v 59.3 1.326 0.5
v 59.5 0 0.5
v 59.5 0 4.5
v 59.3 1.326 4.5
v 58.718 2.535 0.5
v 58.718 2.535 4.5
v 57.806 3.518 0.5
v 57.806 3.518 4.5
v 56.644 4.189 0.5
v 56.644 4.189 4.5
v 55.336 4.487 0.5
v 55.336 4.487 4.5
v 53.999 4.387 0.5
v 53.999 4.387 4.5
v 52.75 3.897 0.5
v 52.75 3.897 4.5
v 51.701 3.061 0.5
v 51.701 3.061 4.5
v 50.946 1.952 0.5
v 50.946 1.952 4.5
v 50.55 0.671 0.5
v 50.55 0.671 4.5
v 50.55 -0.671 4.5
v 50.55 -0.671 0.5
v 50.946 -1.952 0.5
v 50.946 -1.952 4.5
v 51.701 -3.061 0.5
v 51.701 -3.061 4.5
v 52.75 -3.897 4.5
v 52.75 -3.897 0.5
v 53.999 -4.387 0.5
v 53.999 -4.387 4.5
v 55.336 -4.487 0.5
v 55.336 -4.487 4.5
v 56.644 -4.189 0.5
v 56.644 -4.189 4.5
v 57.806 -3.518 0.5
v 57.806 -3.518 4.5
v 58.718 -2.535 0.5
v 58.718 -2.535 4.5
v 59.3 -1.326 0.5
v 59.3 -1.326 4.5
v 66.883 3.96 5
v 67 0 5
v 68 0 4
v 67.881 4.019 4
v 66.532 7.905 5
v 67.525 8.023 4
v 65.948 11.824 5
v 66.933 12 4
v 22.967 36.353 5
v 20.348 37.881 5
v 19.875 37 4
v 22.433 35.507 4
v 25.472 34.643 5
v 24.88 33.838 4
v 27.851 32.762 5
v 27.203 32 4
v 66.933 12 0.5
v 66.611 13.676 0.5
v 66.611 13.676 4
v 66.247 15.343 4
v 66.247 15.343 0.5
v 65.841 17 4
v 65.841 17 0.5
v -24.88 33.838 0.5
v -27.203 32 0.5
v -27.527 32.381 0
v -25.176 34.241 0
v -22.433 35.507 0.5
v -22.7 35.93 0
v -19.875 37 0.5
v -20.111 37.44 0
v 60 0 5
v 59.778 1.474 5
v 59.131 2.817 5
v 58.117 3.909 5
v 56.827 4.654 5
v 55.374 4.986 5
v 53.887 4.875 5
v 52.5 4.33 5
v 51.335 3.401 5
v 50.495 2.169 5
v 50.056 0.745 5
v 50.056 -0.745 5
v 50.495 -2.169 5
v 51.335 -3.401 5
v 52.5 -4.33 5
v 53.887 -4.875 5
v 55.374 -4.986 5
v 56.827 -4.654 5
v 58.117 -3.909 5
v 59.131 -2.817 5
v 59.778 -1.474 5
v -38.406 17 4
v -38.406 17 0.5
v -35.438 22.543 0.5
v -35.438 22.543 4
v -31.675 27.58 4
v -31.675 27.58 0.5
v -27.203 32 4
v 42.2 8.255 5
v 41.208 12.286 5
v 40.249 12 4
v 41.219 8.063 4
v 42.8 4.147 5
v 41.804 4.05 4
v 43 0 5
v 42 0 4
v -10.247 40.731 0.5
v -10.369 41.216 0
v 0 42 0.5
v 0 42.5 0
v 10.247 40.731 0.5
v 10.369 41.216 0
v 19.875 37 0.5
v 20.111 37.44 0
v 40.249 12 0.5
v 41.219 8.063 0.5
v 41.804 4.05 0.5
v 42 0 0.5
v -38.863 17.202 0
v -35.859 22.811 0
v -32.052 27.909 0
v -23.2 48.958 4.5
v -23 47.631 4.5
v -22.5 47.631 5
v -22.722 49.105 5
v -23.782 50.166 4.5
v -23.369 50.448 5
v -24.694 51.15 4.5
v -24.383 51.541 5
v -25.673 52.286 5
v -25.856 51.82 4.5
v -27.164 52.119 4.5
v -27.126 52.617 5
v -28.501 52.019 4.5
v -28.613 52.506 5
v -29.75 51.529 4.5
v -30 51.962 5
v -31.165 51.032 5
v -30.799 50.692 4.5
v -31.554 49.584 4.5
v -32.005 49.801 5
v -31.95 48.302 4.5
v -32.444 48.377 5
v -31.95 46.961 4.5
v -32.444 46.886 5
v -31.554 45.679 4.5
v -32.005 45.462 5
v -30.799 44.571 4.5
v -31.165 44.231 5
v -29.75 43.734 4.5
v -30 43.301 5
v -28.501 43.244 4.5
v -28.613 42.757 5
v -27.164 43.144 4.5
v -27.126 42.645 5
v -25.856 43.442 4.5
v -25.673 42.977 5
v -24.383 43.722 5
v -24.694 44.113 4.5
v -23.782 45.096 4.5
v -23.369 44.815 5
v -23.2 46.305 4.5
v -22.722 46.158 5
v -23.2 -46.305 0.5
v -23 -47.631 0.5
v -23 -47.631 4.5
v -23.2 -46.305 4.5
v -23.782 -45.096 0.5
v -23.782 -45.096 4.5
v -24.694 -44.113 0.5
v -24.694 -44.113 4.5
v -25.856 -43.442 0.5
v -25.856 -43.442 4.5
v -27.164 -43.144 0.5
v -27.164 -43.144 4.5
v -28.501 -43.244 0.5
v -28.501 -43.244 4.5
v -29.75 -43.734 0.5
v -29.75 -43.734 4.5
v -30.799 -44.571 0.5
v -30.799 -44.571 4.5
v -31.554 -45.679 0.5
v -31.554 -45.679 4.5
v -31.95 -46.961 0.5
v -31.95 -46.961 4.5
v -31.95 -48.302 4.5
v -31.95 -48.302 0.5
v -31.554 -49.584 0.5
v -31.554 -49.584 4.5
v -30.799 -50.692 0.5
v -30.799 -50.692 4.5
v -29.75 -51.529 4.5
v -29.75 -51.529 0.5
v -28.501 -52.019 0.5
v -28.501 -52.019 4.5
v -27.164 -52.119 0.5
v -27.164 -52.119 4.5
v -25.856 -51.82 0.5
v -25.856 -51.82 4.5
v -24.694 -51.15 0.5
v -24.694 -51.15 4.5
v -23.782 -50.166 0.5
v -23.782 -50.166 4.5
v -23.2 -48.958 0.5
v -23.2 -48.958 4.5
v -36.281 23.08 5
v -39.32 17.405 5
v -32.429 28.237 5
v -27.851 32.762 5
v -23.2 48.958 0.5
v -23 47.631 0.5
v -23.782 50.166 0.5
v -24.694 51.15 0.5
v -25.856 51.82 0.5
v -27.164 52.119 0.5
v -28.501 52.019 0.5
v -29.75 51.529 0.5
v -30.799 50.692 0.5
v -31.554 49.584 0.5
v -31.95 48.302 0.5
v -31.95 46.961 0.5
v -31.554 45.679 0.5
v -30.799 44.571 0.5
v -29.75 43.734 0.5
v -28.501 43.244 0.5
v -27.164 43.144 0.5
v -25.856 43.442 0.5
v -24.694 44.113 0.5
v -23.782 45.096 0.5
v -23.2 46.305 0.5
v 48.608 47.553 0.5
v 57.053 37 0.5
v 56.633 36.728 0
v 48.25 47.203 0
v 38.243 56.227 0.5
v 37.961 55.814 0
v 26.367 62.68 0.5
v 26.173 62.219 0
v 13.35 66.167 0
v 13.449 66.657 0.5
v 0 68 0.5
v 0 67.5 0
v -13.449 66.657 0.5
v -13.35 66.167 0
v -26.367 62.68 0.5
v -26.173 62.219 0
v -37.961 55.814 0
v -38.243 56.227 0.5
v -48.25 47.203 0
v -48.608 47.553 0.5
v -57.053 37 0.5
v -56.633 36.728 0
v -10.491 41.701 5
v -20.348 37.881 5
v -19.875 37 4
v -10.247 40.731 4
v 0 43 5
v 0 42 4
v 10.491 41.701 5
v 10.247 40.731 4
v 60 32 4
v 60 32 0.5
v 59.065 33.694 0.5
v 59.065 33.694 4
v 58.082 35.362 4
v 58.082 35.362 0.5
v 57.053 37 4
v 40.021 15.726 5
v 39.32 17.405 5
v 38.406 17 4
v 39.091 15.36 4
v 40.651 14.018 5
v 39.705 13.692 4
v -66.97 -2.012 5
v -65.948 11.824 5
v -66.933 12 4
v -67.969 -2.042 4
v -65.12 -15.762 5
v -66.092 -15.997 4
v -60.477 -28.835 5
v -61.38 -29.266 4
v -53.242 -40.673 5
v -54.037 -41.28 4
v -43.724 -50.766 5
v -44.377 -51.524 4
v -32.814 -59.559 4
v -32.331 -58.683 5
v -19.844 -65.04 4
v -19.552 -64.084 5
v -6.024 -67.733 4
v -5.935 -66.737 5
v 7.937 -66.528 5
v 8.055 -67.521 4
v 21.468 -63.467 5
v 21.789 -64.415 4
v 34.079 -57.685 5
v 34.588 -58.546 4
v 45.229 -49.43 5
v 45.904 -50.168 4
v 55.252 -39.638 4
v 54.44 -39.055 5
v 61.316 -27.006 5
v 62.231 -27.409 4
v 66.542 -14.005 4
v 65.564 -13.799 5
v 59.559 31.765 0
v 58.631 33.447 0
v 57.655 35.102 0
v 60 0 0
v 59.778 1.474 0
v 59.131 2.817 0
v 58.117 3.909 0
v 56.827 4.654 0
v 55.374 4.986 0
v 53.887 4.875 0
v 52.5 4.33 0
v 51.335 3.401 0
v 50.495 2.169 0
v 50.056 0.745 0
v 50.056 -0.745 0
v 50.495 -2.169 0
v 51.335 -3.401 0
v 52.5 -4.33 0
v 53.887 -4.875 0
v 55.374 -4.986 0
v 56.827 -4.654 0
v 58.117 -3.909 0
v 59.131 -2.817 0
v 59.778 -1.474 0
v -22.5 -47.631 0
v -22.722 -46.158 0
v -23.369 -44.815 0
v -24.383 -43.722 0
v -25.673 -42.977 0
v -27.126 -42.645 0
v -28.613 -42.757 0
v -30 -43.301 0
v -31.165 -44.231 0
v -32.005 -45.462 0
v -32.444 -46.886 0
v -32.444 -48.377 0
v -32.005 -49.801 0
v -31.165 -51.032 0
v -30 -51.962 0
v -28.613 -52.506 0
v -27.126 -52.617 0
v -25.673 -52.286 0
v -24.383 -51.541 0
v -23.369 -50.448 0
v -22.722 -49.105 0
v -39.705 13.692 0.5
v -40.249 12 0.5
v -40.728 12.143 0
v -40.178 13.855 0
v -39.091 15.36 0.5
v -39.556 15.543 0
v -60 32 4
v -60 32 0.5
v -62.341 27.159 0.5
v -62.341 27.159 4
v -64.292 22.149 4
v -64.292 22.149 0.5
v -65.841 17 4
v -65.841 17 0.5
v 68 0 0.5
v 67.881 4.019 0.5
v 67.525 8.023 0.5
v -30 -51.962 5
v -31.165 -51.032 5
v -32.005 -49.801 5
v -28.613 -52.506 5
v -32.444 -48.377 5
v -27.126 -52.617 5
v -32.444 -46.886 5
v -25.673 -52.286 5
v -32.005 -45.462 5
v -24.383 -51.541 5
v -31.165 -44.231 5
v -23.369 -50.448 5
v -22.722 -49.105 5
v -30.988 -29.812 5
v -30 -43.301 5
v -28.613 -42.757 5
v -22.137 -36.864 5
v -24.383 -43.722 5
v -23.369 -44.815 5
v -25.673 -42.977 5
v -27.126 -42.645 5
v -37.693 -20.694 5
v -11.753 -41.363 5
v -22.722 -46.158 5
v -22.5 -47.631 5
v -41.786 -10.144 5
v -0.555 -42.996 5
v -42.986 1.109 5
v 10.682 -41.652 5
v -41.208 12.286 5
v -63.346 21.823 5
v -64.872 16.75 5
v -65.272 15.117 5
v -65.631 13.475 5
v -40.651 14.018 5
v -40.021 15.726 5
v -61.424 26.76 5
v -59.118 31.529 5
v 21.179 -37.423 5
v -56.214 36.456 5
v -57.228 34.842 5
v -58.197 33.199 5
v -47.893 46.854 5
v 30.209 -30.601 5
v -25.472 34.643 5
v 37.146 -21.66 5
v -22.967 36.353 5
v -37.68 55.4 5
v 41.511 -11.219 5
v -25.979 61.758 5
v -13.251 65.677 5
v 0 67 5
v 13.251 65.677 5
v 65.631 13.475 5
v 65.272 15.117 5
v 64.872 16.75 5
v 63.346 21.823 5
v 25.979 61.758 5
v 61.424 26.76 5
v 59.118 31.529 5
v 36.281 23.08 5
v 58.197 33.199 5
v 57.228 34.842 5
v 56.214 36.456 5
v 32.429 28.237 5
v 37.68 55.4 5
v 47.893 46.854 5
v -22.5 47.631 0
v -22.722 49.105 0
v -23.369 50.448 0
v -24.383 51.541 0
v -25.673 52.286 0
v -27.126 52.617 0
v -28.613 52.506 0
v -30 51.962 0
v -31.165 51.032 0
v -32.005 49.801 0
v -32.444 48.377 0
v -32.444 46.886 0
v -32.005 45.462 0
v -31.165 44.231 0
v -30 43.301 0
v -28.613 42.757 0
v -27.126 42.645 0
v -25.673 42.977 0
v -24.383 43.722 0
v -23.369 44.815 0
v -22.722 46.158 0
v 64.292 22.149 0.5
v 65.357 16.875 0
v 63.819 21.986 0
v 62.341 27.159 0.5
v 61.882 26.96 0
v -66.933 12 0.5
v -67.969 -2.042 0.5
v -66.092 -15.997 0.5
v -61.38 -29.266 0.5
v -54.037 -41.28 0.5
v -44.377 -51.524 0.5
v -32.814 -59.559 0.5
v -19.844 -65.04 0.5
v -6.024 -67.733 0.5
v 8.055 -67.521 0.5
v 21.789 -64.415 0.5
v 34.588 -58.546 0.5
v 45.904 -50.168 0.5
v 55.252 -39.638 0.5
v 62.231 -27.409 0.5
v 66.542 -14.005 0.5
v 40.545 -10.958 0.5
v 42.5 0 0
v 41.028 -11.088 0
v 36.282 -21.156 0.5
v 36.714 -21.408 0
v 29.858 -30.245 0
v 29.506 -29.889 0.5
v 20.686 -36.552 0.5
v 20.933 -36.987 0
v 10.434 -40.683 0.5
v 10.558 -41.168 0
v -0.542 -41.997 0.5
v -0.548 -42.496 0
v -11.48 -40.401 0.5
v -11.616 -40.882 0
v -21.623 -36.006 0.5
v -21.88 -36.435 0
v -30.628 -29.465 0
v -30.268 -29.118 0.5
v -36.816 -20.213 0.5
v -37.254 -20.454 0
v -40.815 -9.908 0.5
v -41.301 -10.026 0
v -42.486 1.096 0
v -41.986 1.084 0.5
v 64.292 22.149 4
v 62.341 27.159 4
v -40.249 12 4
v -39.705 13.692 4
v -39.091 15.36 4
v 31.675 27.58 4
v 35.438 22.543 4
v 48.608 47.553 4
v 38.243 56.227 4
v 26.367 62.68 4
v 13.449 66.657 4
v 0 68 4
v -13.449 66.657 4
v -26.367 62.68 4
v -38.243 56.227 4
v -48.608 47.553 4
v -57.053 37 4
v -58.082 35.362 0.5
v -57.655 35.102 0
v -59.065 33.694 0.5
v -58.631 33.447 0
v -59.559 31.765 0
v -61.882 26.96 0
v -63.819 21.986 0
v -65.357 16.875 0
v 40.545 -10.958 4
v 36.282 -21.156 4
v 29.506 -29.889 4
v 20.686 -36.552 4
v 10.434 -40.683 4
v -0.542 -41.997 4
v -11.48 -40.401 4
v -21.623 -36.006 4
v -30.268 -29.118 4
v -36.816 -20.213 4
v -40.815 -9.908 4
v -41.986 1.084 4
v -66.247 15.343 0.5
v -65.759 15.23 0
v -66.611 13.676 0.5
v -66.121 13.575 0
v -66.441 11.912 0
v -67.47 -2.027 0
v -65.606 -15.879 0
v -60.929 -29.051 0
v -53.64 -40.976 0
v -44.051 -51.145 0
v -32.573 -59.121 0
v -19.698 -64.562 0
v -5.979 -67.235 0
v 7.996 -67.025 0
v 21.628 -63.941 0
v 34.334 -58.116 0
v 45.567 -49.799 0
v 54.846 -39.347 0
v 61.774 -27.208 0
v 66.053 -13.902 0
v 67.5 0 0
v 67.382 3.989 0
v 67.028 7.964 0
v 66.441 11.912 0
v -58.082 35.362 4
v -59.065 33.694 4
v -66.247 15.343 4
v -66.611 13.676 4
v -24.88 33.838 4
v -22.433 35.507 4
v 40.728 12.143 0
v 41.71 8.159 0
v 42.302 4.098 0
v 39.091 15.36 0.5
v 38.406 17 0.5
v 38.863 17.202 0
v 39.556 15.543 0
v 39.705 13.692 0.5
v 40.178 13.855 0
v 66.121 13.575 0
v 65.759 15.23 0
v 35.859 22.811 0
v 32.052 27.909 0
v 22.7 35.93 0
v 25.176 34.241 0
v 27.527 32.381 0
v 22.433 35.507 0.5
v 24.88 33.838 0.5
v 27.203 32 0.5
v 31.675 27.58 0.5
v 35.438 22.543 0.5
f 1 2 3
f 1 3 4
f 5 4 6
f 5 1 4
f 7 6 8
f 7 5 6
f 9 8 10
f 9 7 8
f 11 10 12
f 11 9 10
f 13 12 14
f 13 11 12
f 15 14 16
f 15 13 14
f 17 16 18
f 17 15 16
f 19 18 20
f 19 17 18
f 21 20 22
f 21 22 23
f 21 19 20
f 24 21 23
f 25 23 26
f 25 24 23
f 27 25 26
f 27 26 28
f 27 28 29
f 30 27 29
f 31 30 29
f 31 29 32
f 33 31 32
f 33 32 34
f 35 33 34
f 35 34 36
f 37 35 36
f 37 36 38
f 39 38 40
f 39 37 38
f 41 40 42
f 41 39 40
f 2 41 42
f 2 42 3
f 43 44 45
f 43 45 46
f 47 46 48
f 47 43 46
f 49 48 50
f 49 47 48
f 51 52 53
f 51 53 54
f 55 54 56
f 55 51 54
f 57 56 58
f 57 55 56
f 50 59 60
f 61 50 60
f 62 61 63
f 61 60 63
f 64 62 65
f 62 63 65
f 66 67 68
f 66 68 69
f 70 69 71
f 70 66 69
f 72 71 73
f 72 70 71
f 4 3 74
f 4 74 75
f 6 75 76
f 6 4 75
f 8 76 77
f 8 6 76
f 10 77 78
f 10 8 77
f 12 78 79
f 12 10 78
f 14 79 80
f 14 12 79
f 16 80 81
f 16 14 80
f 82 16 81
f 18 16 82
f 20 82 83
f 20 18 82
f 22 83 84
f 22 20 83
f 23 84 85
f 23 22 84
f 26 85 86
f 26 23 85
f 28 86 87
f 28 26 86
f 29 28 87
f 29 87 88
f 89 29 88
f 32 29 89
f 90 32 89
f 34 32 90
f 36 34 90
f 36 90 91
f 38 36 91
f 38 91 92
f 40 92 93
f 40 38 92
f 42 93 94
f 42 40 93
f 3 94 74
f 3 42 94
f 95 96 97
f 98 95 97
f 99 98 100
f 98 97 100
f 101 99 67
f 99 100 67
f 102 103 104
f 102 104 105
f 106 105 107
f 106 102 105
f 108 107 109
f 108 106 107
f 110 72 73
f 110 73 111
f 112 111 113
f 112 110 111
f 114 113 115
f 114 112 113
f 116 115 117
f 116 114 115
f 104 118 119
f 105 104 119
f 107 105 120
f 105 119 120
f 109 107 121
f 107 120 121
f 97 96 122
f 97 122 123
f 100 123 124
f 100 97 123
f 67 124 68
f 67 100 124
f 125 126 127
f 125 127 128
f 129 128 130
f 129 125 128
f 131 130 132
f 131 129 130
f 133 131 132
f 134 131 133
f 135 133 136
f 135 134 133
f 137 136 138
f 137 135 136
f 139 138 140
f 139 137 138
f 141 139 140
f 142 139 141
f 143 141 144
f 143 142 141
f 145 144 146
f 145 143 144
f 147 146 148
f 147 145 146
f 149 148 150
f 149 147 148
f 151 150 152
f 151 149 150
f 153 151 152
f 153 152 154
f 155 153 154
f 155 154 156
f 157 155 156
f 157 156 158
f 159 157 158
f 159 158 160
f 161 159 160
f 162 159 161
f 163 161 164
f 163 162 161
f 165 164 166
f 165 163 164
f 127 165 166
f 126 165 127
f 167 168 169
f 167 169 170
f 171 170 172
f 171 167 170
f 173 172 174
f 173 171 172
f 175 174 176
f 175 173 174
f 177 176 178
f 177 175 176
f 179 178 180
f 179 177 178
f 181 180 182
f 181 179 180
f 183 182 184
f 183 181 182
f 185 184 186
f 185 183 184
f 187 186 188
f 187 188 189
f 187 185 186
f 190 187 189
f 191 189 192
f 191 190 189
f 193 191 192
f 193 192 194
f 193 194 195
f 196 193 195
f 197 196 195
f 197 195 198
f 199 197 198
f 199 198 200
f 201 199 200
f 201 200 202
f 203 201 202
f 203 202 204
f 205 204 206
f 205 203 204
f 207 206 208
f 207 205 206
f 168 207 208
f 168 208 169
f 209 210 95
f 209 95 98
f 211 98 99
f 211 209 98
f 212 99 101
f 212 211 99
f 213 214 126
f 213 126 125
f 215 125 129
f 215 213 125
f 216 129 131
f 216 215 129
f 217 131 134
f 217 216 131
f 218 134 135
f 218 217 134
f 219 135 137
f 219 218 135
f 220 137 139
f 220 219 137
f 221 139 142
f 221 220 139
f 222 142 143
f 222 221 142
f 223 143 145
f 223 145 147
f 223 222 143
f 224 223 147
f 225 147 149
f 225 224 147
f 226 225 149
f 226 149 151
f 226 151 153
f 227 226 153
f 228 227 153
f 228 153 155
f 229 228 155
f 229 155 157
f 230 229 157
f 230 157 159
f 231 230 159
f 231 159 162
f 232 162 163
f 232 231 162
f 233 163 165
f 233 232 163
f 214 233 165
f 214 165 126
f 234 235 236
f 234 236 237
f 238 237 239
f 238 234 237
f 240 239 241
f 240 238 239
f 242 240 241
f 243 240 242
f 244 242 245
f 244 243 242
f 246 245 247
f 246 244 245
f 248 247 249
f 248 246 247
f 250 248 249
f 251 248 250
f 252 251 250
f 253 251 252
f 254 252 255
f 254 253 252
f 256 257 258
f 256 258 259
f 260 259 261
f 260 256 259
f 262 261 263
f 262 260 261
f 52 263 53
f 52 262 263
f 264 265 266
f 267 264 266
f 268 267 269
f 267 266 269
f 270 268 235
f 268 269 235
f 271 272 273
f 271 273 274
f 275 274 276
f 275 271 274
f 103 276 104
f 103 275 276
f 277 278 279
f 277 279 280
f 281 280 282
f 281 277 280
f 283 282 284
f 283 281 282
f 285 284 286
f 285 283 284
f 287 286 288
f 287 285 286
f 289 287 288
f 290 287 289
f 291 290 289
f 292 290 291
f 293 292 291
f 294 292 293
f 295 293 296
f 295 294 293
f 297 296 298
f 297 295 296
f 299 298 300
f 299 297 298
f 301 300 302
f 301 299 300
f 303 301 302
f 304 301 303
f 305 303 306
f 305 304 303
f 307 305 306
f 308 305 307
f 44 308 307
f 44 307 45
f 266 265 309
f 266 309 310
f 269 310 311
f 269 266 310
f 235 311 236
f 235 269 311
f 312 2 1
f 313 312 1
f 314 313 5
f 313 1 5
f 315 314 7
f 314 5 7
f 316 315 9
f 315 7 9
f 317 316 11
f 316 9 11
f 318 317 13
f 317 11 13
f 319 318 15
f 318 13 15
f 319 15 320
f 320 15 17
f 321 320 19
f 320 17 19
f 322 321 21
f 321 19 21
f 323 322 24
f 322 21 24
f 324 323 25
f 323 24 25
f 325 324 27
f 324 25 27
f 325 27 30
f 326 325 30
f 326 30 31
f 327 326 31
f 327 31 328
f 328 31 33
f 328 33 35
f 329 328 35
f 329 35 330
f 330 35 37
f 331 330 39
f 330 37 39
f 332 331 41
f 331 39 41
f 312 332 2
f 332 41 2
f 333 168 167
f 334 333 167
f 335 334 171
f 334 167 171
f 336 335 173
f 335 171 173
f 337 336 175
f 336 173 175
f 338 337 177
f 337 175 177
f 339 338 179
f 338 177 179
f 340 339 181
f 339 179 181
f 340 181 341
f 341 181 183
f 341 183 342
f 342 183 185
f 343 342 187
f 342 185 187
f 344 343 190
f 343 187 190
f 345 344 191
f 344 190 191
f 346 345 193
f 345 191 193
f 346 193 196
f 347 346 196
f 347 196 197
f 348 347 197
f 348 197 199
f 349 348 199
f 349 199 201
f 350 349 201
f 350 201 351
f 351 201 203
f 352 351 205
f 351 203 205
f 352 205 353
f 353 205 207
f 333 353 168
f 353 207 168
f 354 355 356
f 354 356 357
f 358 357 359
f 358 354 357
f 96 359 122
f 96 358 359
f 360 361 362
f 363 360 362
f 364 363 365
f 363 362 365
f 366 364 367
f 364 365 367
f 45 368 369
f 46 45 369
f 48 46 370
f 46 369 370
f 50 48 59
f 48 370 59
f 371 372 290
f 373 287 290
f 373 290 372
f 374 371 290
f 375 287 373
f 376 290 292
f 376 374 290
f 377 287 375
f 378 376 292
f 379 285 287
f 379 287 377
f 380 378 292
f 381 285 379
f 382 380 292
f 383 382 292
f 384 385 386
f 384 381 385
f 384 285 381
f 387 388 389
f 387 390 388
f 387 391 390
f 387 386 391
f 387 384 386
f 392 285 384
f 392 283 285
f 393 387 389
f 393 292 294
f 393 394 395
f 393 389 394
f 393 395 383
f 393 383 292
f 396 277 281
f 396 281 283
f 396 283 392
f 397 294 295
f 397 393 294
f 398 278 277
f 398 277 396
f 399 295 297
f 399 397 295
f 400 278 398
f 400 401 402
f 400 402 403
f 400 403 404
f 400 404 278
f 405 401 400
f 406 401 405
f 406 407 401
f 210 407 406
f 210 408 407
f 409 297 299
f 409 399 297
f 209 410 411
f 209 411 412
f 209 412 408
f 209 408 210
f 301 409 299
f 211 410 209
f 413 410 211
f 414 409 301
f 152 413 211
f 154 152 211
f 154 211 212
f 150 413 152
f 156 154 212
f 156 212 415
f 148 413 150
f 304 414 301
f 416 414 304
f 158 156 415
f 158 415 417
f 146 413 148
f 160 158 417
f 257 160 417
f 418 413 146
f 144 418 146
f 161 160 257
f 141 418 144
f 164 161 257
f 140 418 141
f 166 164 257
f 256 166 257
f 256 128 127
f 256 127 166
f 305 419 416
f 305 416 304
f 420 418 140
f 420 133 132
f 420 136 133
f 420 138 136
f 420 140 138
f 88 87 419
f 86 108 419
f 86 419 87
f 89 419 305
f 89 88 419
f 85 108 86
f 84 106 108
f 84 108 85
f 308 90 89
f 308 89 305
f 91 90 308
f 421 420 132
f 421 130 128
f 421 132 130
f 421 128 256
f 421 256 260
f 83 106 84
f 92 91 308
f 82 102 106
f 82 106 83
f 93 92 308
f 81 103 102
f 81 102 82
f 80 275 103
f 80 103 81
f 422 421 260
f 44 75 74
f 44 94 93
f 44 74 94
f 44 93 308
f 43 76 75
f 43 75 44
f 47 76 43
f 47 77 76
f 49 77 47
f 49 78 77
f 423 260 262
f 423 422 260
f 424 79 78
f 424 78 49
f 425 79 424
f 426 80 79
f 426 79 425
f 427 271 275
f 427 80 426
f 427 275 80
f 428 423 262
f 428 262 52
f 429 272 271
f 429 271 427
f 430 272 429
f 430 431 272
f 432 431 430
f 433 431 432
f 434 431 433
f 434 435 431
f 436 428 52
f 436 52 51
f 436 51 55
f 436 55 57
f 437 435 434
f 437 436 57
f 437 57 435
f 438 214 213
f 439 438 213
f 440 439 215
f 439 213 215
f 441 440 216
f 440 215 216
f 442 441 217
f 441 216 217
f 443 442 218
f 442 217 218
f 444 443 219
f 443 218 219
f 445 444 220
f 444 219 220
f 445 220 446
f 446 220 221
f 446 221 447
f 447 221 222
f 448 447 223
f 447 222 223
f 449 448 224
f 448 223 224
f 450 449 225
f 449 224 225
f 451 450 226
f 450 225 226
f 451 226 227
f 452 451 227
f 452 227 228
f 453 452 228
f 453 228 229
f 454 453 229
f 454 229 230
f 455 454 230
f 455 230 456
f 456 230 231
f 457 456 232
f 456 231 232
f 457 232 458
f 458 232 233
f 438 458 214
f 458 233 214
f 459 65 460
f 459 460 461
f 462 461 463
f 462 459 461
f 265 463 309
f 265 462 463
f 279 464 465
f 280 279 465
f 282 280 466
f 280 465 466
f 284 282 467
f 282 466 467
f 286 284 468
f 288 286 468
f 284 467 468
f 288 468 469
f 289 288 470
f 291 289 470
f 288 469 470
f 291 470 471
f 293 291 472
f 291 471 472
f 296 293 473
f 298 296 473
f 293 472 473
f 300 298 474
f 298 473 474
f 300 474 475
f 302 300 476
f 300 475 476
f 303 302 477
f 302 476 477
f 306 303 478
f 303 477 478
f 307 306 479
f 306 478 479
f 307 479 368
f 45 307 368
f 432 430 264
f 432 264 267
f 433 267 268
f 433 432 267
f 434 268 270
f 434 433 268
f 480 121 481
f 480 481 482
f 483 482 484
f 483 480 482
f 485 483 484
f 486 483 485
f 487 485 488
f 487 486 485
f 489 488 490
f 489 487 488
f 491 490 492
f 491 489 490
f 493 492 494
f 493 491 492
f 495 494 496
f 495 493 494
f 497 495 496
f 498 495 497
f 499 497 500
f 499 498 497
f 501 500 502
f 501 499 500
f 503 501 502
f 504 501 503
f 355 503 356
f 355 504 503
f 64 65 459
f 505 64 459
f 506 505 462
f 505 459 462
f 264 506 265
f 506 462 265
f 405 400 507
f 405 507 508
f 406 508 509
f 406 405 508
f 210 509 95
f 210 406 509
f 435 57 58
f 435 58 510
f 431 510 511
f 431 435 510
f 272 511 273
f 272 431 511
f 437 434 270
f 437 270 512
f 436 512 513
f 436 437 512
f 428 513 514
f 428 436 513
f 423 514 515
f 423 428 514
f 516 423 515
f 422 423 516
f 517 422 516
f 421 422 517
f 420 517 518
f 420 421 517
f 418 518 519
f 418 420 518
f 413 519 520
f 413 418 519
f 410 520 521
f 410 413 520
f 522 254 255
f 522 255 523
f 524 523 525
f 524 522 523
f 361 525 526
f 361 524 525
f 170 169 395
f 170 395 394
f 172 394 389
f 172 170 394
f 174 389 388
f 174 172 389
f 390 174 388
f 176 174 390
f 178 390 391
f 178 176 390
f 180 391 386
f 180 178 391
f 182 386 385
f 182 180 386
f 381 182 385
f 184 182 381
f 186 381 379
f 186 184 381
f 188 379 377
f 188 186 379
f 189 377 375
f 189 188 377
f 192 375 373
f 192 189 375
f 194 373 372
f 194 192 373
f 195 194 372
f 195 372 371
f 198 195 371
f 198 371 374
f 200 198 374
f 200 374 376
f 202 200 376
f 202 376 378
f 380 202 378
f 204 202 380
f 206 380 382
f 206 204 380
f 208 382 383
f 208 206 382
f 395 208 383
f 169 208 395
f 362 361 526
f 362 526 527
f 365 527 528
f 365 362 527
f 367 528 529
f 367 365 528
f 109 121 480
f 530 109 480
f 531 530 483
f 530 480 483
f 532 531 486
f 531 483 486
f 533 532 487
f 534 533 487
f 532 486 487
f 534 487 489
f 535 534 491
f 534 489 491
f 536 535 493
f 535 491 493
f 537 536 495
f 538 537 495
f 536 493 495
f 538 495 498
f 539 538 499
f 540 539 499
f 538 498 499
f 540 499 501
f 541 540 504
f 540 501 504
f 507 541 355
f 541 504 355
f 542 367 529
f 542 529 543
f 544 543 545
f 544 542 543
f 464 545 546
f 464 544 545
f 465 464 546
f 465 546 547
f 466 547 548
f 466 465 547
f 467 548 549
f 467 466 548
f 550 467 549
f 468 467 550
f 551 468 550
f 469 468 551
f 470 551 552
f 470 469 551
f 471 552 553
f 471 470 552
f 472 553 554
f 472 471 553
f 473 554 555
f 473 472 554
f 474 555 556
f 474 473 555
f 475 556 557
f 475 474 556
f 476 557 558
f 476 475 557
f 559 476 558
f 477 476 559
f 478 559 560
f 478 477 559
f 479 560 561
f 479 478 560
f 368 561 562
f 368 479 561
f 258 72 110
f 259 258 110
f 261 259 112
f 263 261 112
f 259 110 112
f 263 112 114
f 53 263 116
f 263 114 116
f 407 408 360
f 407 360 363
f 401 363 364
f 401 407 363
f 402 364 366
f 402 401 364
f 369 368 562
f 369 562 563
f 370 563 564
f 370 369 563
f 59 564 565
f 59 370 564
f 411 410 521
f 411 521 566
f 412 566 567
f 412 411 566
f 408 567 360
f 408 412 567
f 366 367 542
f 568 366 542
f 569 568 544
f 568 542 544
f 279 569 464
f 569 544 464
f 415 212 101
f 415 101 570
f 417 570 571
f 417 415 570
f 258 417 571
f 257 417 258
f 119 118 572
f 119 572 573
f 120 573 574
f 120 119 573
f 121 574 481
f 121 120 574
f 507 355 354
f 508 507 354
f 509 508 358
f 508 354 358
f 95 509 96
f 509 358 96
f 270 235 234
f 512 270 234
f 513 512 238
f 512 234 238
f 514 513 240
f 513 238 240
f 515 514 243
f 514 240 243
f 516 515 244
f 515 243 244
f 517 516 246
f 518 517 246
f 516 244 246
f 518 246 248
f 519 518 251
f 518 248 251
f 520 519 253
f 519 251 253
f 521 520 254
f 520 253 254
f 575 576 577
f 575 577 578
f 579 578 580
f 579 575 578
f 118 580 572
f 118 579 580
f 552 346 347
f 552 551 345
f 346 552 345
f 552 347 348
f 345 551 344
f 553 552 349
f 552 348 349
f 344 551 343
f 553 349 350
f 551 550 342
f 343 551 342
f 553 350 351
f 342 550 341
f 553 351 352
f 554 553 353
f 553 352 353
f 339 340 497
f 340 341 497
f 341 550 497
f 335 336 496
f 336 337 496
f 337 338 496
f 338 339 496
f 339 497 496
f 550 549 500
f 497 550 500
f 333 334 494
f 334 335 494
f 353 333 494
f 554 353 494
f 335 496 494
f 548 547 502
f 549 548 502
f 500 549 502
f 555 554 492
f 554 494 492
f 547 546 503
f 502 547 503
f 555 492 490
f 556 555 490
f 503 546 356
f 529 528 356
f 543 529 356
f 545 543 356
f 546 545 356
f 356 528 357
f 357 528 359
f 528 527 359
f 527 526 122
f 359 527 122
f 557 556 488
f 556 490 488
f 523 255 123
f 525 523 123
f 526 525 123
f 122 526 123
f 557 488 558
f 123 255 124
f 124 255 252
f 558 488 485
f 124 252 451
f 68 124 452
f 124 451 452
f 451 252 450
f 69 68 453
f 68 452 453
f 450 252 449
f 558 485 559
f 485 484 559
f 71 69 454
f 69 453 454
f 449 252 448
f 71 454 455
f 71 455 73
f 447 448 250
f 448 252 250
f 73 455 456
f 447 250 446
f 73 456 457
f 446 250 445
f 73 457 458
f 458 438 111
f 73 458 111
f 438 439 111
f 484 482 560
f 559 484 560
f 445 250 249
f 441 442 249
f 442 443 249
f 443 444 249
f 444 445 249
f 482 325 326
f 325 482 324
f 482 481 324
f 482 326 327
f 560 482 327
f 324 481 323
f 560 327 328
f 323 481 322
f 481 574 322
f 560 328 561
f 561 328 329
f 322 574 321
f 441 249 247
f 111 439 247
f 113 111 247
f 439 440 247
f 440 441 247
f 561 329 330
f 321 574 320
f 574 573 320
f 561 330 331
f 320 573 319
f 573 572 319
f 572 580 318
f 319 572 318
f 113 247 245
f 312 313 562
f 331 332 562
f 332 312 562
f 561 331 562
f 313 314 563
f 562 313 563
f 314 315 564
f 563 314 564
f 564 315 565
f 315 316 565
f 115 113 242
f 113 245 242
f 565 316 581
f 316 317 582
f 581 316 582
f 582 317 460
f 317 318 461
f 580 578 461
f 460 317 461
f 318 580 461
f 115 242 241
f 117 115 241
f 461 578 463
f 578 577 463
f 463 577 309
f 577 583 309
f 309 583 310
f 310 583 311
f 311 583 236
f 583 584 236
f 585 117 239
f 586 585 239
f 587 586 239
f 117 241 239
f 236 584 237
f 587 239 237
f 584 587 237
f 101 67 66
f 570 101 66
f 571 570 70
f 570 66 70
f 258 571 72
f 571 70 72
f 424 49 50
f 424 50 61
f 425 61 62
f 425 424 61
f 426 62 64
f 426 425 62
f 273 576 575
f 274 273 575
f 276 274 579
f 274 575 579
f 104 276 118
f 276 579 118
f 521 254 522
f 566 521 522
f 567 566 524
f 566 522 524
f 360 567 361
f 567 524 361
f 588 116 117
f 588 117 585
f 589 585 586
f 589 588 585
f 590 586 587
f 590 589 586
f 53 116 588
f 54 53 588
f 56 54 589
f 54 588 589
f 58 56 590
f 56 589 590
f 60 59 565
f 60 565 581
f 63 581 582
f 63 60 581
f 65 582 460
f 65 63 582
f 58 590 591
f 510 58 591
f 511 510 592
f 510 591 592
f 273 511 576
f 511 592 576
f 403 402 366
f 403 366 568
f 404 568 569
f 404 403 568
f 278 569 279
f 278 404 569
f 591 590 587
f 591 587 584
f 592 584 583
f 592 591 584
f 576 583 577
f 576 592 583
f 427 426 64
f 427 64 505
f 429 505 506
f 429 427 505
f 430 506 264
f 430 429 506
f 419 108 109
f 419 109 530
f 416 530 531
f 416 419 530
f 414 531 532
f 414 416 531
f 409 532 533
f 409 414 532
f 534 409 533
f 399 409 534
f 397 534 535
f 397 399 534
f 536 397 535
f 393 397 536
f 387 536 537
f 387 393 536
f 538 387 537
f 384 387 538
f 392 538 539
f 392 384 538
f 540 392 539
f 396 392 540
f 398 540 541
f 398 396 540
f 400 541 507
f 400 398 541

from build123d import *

# Parameters (mm, degrees)
F0_R     = 4.5
F1_DEPTH = 5
F2_SIZE  = 1
F3_SIZE  = 0.5


with BuildPart() as f1:
    # F0 (on Top) → F1 (new body)
    with BuildSketch(Plane.XY):
        with BuildLine():
            Line((55.8569601751, 37), (57.0526073024, 37))
            ThreePointArc((57.0526073024, 37), (0, 68), (-57.0526073024, 37))
            Line((-57.0526073024, 37), (-55.8569601751, 37))
            ThreePointArc((-55.8569601751, 37), (0, 67), (55.8569601751, 37))
        make_face()
        with BuildLine():
            Line((21.9089023002, 37), (55.8569601751, 37))
            ThreePointArc((55.8569601751, 37), (0, 67), (-55.8569601751, 37))
            Line((-55.8569601751, 37), (-21.9089023002, 37))
            ThreePointArc((-21.9089023002, 37), (0, 43), (21.9089023002, 37))
        make_face()
        with Locations((-27.5, 47.6313972081)):
            Circle(F0_R, mode=Mode.SUBTRACT)
        with BuildLine():
            Line((19.8746069144, 37), (21.9089023002, 37))
            ThreePointArc((21.9089023002, 37), (0, 43), (-21.9089023002, 37))
            Line((-21.9089023002, 37), (-19.8746069144, 37))
            ThreePointArc((-19.8746069144, 37), (0, 42), (19.8746069144, 37))
        make_face()
        with BuildLine():
            ThreePointArc((-21.9089023002, 37), (-25.438998692, 34.6678142598), (-28.7228132327, 32))
            Line((-28.7228132327, 32), (-27.2029410175, 32))
            ThreePointArc((-27.2029410175, 32), (-23.6711613534, 34.6940358013), (-19.8746069144, 37))
            Line((-19.8746069144, 37), (-21.9089023002, 37))
        make_face()
        with BuildLine():
            ThreePointArc((-55.8569601751, 37), (-57.4150594449, 34.5327518298), (-58.864250611, 32))
            Line((-58.864250611, 32), (-28.7228132327, 32))
            ThreePointArc((-28.7228132327, 32), (-25.438998692, 34.6678142598), (-21.9089023002, 37))
            Line((-21.9089023002, 37), (-55.8569601751, 37))
        make_face()
        with BuildLine():
            ThreePointArc((-57.0526073024, 37), (-58.579674112, 34.5314607413), (-60, 32))
            Line((-60, 32), (-58.864250611, 32))
            ThreePointArc((-58.864250611, 32), (-57.4150594449, 34.5327518298), (-55.8569601751, 37))
            Line((-55.8569601751, 37), (-57.0526073024, 37))
        make_face()
        with BuildLine():
            ThreePointArc((-58.864250611, 32), (-62.2890016221, 24.6795517974), (-64.8074069841, 17))
            Line((-64.8074069841, 17), (-39.4968353163, 17))
            ThreePointArc((-39.4968353163, 17), (-34.9246347445, 25.0852523999), (-28.7228132327, 32))
            Line((-28.7228132327, 32), (-58.864250611, 32))
        make_face()
        with BuildLine():
            ThreePointArc((-60, 32), (-63.3657755146, 24.6734370008), (-65.8407168855, 17))
            Line((-65.8407168855, 17), (-64.8074069841, 17))
            ThreePointArc((-64.8074069841, 17), (-62.2890016221, 24.6795517974), (-58.864250611, 32))
            Line((-58.864250611, 32), (-60, 32))
        make_face()
        with BuildLine():
            ThreePointArc((-28.7228132327, 32), (-34.9246347445, 25.0852523999), (-39.4968353163, 17))
            Line((-39.4968353163, 17), (-38.4057287393, 17))
            ThreePointArc((-38.4057287393, 17), (-33.6507709691, 25.1321629229), (-27.2029410175, 32))
            Line((-27.2029410175, 32), (-28.7228132327, 32))
        make_face()
        with BuildLine():
            Line((39.4968353163, 17), (64.8074069841, 17))
            ThreePointArc((64.8074069841, 17), (62.2890016221, 24.6795517974), (58.864250611, 32))
            Line((58.864250611, 32), (28.7228132327, 32))
            ThreePointArc((28.7228132327, 32), (34.9246347445, 25.0852523999), (39.4968353163, 17))
        make_face()
        with BuildLine():
            Line((58.864250611, 32), (60, 32))
            ThreePointArc((60, 32), (58.579674112, 34.5314607413), (57.0526073024, 37))
            Line((57.0526073024, 37), (55.8569601751, 37))
            ThreePointArc((55.8569601751, 37), (57.4150594449, 34.5327518298), (58.864250611, 32))
        make_face()
        with BuildLine():
            Line((28.7228132327, 32), (58.864250611, 32))
            ThreePointArc((58.864250611, 32), (57.4150594449, 34.5327518298), (55.8569601751, 37))
            Line((55.8569601751, 37), (21.9089023002, 37))
            ThreePointArc((21.9089023002, 37), (25.438998692, 34.6678142598), (28.7228132327, 32))
        make_face()
        with BuildLine():
            Line((27.2029410175, 32), (28.7228132327, 32))
            ThreePointArc((28.7228132327, 32), (25.438998692, 34.6678142598), (21.9089023002, 37))
            Line((21.9089023002, 37), (19.8746069144, 37))
            ThreePointArc((19.8746069144, 37), (23.6711613534, 34.6940358013), (27.2029410175, 32))
        make_face()
        with BuildLine():
            Line((38.4057287393, 17), (39.4968353163, 17))
            ThreePointArc((39.4968353163, 17), (34.9246347445, 25.0852523999), (28.7228132327, 32))
            Line((28.7228132327, 32), (27.2029410175, 32))
            ThreePointArc((27.2029410175, 32), (33.6507709691, 25.1321629229), (38.4057287393, 17))
        make_face()
        with BuildLine():
            Line((64.8074069841, 17), (65.8407168855, 17))
            ThreePointArc((65.8407168855, 17), (63.3657755146, 24.6734370008), (60, 32))
            Line((60, 32), (58.864250611, 32))
            ThreePointArc((58.864250611, 32), (62.2890016221, 24.6795517974), (64.8074069841, 17))
        make_face()
        with BuildLine():
            Line((65.9166139907, 12), (66.9328021227, 12))
            ThreePointArc((66.9328021227, 12), (66.4338154667, 14.5102778244), (65.8407168855, 17))
            Line((65.8407168855, 17), (64.8074069841, 17))
            ThreePointArc((64.8074069841, 17), (65.4098036609, 14.5106025046), (65.9166139907, 12))
        make_face()
        with BuildLine():
            Line((41.2916456441, 12), (65.9166139907, 12))
            ThreePointArc((65.9166139907, 12), (65.4098036609, 14.5106025046), (64.8074069841, 17))
            Line((64.8074069841, 17), (39.4968353163, 17))
            ThreePointArc((39.4968353163, 17), (40.471529054, 14.5277436661), (41.2916456441, 12))
        make_face()
        with BuildLine():
            Line((40.249223595, 12), (41.2916456441, 12))
            ThreePointArc((41.2916456441, 12), (40.471529054, 14.5277436661), (39.4968353163, 17))
            Line((39.4968353163, 17), (38.4057287393, 17))
            ThreePointArc((38.4057287393, 17), (39.4068570388, 14.5292676457), (40.249223595, 12))
        make_face()
        with BuildLine():
            ThreePointArc((43, 0), (42.5707690951, 6.060496568), (41.2916456441, 12))
            Line((41.2916456441, 12), (40.249223595, 12))
            ThreePointArc((40.249223595, 12), (41.5600011489, 6.0635224503), (42, 0))
            ThreePointArc((42, 0), (-6.0635224503, -41.5600011489), (-40.249223595, 12))
            Line((-40.249223595, 12), (-41.2916456441, 12))
            ThreePointArc((-41.2916456441, 12), (-6.060496568, -42.5707690951), (43, 0))
        make_face()
        with BuildLine():
            ThreePointArc((67, 0), (66.7286038269, 6.0244029838), (65.9166139907, 12))
            Line((65.9166139907, 12), (41.2916456441, 12))
            ThreePointArc((41.2916456441, 12), (42.5707690951, 6.060496568), (43, 0))
            ThreePointArc((43, 0), (-6.060496568, -42.5707690951), (-41.2916456441, 12))
            Line((-41.2916456441, 12), (-65.9166139907, 12))
            ThreePointArc((-65.9166139907, 12), (-6.0244029838, -66.7286038269), (67, 0))
        make_face()
        with Locations((-27.5, -47.6313972081)):
            Circle(F0_R, mode=Mode.SUBTRACT)
        with Locations((55, 0)):
            Circle(F0_R, mode=Mode.SUBTRACT)
        with BuildLine():
            ThreePointArc((-66.9328021227, 12), (-6.0236805881, -67.7326750703), (68, 0))
            ThreePointArc((68, 0), (67.7326750703, 6.0236805881), (66.9328021227, 12))
            Line((66.9328021227, 12), (65.9166139907, 12))
            ThreePointArc((65.9166139907, 12), (66.7286038269, 6.0244029838), (67, 0))
            ThreePointArc((67, 0), (-6.0244029838, -66.7286038269), (-65.9166139907, 12))
            Line((-65.9166139907, 12), (-66.9328021227, 12))
        make_face()
        with BuildLine():
            ThreePointArc((-39.4968353163, 17), (-40.471529054, 14.5277436661), (-41.2916456441, 12))
            Line((-41.2916456441, 12), (-40.249223595, 12))
            ThreePointArc((-40.249223595, 12), (-39.4068570388, 14.5292676457), (-38.4057287393, 17))
            Line((-38.4057287393, 17), (-39.4968353163, 17))
        make_face()
        with BuildLine():
            ThreePointArc((-65.8407168855, 17), (-66.4338154667, 14.5102778244), (-66.9328021227, 12))
            Line((-66.9328021227, 12), (-65.9166139907, 12))
            ThreePointArc((-65.9166139907, 12), (-65.4098036609, 14.5106025046), (-64.8074069841, 17))
            Line((-64.8074069841, 17), (-65.8407168855, 17))
        make_face()
        with BuildLine():
            ThreePointArc((-64.8074069841, 17), (-65.4098036609, 14.5106025046), (-65.9166139907, 12))
            Line((-65.9166139907, 12), (-41.2916456441, 12))
            ThreePointArc((-41.2916456441, 12), (-40.471529054, 14.5277436661), (-39.4968353163, 17))
            Line((-39.4968353163, 17), (-64.8074069841, 17))
        make_face()
    extrude(amount=F1_DEPTH)

    # F2
    f2_edges = [f1.edges().sort_by_distance(p)[0] for p in [
        (65.840717, -17, 5),
        (40.249224, -12, 5),
    ]]
    chamfer(f2_edges, length=F2_SIZE)

    # F3
    f3_edges = [f1.edges().sort_by_distance(p)[0] for p in [
        (-32, 47.631397, 5),
        (40.249224, -12, 0),
        (-32, 47.631397, 0),
        (65.840717, -17, 0),
        (50.5, 0, 5),
        (50.5, 0, 0),
        (-32, -47.631397, 5),
        (-32, -47.631397, 0),
    ]]
    chamfer(f3_edges, length=F3_SIZE)


solid = f1.part
